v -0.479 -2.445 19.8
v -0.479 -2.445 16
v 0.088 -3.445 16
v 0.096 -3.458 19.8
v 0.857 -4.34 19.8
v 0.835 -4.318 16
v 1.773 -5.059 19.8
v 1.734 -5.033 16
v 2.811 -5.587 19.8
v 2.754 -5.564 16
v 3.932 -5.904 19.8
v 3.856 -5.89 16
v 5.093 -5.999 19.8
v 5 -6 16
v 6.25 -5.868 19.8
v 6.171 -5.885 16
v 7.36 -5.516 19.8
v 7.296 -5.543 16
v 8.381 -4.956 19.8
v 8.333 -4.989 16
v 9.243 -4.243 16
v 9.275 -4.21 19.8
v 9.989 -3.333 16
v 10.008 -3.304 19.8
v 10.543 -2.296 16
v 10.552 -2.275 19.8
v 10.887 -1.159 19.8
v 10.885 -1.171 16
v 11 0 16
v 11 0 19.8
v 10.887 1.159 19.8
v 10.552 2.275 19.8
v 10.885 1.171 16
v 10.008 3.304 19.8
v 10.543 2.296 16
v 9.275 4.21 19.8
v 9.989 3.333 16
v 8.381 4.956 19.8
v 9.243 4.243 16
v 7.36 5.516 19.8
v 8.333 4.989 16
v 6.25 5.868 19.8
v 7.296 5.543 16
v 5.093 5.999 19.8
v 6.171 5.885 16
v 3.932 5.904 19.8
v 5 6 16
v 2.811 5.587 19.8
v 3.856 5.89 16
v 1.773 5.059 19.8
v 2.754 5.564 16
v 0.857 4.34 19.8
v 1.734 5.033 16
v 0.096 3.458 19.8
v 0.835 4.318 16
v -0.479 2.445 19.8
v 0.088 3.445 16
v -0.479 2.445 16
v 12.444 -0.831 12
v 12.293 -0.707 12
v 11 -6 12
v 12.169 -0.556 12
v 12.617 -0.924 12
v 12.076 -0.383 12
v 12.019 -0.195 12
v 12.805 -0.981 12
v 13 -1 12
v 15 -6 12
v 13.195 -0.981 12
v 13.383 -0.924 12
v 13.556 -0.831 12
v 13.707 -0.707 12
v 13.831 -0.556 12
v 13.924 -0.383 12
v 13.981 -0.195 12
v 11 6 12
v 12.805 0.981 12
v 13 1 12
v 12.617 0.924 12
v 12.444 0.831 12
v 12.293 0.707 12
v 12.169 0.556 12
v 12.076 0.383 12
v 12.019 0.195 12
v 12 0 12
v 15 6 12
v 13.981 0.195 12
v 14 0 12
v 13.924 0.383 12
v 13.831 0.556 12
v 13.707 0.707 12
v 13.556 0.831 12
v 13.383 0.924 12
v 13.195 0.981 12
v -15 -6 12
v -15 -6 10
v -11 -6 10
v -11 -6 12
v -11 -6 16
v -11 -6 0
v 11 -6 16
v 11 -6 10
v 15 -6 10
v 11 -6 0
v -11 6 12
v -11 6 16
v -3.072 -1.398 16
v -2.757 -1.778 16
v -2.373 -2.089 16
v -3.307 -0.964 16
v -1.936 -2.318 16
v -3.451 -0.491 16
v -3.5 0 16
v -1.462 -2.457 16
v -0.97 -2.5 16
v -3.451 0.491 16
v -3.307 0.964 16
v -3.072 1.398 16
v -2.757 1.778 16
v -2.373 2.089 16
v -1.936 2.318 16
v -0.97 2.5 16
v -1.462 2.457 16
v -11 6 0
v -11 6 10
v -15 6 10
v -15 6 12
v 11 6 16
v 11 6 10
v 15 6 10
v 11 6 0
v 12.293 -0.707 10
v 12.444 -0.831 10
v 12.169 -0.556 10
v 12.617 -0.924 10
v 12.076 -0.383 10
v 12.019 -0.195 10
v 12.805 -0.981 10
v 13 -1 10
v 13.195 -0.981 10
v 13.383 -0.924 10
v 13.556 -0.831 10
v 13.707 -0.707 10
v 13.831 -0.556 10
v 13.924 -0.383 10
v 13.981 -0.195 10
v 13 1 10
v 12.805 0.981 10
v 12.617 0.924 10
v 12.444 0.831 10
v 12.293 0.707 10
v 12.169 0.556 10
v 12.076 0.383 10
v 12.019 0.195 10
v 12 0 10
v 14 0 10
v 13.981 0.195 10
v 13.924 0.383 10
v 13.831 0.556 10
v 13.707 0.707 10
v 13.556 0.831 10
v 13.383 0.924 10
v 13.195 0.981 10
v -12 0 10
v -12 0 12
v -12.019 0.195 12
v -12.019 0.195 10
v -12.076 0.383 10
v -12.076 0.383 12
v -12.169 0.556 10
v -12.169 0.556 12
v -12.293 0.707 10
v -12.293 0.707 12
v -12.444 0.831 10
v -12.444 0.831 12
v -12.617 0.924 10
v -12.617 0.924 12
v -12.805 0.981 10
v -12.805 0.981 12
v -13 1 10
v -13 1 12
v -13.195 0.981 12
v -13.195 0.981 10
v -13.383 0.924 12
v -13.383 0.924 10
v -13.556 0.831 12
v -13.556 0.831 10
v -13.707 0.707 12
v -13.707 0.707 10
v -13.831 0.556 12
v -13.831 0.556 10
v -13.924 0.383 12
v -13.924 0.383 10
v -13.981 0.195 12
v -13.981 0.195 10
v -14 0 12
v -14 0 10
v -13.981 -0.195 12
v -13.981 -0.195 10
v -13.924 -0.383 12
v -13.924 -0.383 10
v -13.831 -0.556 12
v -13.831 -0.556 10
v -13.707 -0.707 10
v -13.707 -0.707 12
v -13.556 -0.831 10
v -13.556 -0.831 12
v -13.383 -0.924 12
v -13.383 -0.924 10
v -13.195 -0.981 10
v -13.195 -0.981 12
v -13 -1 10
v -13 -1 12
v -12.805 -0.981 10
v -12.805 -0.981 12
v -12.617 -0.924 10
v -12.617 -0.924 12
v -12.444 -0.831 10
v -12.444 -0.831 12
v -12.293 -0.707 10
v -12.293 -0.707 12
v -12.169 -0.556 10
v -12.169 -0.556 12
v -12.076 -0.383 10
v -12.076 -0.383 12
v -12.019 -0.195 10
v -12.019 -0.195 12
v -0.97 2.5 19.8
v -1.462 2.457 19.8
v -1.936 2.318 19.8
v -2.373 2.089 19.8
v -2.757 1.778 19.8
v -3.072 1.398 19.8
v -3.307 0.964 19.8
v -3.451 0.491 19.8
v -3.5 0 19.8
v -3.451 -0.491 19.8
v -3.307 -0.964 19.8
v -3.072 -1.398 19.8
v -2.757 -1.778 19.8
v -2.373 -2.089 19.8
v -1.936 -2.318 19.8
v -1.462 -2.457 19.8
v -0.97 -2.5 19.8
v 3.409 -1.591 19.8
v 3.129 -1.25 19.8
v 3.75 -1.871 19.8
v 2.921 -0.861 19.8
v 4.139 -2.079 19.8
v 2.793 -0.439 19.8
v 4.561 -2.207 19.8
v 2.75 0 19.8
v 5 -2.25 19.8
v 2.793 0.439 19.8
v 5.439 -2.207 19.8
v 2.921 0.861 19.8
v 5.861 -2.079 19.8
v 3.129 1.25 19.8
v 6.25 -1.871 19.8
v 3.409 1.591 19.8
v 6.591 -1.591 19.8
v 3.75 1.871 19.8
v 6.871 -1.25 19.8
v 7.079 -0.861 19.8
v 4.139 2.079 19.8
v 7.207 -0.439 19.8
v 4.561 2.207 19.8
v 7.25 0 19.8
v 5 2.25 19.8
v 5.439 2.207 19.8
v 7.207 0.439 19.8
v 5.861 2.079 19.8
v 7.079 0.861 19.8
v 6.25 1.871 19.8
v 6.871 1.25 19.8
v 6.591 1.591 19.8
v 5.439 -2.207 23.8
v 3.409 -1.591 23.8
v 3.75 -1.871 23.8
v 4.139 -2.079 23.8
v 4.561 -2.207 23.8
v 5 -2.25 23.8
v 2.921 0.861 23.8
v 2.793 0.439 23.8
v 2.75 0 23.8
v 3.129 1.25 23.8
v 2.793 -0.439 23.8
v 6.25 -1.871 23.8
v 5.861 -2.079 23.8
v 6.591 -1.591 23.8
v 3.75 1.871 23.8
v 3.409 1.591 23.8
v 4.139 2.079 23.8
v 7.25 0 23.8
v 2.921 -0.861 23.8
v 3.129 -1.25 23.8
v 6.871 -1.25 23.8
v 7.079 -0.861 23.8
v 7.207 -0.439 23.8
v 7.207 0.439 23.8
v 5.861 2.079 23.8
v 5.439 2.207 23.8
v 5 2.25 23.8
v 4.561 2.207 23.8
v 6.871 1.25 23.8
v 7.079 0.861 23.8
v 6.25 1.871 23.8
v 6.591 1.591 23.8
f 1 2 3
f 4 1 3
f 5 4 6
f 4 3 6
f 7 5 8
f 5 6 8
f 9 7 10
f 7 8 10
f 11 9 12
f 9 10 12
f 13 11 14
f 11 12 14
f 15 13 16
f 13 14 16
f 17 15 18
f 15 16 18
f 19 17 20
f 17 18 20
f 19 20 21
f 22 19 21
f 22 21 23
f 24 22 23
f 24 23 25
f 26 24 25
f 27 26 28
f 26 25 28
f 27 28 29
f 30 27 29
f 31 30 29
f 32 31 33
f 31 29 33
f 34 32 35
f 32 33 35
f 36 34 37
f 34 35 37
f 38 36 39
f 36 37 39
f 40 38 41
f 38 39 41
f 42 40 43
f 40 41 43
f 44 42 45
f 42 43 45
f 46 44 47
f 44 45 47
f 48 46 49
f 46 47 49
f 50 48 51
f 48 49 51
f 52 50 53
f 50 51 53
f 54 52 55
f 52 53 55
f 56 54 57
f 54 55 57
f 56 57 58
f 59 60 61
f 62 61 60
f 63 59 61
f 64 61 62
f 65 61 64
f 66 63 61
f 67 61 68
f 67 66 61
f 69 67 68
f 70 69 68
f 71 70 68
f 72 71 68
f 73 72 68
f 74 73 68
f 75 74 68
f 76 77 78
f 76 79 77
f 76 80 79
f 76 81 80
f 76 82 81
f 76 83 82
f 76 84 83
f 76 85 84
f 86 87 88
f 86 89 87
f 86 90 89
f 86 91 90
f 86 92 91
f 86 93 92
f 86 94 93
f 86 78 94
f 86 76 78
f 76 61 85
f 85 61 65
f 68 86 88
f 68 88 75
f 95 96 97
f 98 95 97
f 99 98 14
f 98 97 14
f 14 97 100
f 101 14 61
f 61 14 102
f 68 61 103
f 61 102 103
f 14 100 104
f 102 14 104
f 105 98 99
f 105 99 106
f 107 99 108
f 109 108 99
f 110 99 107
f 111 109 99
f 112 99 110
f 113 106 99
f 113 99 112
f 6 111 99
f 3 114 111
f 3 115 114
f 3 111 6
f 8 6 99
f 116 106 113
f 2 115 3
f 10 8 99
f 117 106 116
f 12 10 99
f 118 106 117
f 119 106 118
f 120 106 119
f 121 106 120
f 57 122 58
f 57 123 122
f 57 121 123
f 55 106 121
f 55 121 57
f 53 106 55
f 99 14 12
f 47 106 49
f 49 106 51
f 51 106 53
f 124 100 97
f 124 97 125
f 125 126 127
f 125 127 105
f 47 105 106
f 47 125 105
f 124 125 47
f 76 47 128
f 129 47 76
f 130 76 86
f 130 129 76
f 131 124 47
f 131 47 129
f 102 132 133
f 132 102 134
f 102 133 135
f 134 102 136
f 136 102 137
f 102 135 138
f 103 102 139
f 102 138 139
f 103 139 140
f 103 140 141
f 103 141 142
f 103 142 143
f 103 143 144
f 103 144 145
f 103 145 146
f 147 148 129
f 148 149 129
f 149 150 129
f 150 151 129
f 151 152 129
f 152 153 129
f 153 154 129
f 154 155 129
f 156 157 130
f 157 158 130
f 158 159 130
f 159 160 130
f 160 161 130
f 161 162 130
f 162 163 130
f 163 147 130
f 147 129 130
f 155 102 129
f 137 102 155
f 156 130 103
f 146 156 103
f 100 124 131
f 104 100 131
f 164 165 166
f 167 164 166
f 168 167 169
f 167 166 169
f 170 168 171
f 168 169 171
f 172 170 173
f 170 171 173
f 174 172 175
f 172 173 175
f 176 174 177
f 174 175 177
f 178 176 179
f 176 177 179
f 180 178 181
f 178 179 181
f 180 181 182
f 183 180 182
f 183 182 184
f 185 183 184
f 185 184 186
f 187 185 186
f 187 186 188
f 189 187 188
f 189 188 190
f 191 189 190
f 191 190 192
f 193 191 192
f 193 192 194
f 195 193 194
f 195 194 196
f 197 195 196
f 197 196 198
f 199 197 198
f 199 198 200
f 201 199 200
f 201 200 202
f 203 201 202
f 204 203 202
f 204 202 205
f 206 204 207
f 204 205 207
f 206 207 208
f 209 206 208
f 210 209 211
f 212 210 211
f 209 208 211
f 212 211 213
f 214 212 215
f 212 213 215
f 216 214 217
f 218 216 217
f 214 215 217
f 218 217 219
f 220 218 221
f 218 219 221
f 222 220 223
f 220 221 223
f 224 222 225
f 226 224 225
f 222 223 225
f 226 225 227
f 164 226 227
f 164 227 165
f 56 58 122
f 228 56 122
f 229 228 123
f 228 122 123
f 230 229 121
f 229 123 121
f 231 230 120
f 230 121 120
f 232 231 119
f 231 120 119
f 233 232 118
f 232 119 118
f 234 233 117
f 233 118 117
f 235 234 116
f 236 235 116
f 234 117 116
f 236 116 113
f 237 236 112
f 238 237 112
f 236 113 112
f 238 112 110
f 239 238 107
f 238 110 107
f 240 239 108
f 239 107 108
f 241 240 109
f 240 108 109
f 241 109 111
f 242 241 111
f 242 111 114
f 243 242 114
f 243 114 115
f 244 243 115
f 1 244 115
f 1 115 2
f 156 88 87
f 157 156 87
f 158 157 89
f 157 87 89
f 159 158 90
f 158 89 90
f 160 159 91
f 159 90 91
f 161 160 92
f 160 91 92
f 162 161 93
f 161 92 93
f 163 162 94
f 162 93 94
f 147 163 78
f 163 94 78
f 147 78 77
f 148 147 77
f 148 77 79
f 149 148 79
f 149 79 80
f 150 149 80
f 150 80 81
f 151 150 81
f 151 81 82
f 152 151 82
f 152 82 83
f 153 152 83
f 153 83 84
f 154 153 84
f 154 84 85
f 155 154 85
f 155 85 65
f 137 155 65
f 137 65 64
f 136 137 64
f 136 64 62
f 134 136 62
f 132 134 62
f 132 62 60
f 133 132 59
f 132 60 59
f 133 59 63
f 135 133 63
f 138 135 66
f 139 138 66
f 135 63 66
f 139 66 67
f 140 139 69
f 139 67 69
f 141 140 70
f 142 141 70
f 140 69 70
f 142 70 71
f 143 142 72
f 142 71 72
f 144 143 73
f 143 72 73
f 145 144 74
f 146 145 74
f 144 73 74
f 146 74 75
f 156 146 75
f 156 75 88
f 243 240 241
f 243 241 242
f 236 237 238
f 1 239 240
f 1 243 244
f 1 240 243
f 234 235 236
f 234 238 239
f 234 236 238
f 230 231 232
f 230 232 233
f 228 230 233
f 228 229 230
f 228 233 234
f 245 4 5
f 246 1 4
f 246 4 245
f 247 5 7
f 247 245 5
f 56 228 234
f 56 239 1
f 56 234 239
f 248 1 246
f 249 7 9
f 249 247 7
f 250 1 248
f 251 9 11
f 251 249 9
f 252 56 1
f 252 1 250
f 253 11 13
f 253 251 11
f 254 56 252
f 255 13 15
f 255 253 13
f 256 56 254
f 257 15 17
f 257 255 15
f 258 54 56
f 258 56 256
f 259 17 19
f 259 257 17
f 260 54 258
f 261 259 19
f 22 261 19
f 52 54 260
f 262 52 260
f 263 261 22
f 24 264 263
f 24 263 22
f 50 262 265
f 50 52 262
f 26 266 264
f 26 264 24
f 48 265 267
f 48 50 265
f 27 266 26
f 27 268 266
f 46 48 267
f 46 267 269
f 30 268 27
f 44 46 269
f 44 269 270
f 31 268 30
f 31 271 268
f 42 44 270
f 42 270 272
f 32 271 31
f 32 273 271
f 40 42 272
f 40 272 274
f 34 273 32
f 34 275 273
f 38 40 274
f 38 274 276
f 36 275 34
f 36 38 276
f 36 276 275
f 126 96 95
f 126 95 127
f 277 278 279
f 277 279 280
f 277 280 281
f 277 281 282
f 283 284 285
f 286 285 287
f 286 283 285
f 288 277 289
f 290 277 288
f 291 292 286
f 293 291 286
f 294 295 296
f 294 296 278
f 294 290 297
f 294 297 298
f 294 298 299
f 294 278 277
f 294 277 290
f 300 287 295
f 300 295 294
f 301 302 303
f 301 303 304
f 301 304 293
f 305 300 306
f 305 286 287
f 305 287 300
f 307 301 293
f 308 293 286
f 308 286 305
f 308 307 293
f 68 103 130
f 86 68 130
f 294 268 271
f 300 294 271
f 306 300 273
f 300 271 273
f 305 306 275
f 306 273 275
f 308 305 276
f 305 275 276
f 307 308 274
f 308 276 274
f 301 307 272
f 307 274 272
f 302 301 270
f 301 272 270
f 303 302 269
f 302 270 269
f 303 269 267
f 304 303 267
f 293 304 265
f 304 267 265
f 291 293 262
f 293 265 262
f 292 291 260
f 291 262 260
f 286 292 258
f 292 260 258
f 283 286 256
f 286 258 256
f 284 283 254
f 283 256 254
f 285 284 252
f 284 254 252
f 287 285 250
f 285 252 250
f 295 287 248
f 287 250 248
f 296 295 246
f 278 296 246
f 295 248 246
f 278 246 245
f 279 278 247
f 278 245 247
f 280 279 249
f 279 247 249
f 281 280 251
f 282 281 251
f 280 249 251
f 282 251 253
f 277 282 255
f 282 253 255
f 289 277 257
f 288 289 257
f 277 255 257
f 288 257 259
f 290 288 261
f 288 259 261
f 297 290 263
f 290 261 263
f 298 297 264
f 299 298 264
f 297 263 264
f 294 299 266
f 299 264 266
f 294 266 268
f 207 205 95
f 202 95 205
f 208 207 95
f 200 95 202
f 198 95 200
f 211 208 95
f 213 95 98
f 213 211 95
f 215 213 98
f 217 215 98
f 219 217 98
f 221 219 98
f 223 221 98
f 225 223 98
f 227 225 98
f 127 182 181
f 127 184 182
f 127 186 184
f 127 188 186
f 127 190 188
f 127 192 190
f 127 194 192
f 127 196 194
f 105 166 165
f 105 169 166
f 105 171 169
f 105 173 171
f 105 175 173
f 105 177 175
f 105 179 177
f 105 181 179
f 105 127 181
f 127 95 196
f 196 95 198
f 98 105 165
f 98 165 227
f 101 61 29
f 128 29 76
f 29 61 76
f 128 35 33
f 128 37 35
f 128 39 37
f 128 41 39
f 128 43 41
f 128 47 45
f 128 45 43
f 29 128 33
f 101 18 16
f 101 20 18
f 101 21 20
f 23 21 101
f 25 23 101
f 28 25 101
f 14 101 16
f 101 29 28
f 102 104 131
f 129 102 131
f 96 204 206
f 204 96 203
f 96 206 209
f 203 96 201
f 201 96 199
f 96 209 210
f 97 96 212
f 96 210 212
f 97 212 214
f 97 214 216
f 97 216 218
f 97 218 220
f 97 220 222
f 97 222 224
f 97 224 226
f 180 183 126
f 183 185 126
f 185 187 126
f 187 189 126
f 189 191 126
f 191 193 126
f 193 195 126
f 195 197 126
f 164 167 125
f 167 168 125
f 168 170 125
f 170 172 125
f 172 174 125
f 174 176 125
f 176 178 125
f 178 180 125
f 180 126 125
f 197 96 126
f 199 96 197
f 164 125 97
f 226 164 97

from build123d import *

# Parameters (mm, degrees)
SKETCH1_W      = 22
SKETCH1_H      = 12
EXTRUDE1_DEPTH = 10
SKETCH2_W      = 30
SKETCH2_H      = 12
EXTRUDE2_DEPTH = 2
SKETCH3_W      = 22
SKETCH3_H      = 12
EXTRUDE3_DEPTH = 4
SKETCH4_R      = 1
EXTRUDE4_DEPTH = 13
EXTRUDE5_DEPTH = 3.8
SKETCH6_R      = 2.25
EXTRUDE6_DEPTH = 4


with BuildPart() as part:
    # Sketch1 → Extrude1 (new body)
    with BuildSketch(Plane.XY):
        Rectangle(SKETCH1_W, SKETCH1_H)
    extrude(amount=EXTRUDE1_DEPTH)

    # Sketch2 → Extrude2 (add)
    with BuildSketch(Plane.XY.offset(10)):
        Rectangle(SKETCH2_W, SKETCH2_H)
    extrude(amount=EXTRUDE2_DEPTH)

    # Sketch3 → Extrude3 (add)
    with BuildSketch(Plane.XY.offset(12)):
        Rectangle(SKETCH3_W, SKETCH3_H)
    extrude(amount=EXTRUDE3_DEPTH)

    # Sketch4 → Extrude4 (cut, through all)
    with BuildSketch(Plane.XY.offset(12)):
        with Locations((-13, 0)):
            Circle(SKETCH4_R)
        with Locations((13, 0)):
            Circle(SKETCH4_R)
    extrude(amount=-EXTRUDE4_DEPTH, mode=Mode.SUBTRACT)

    # Sketch5 → Extrude5 (add)
    with BuildSketch(Plane.XY.offset(16)):
        with BuildLine():
            ThreePointArc((-0.479166667, -2.445144707), (11, 0), (-0.479166667, 2.445144707))
            ThreePointArc((-0.479166667, 2.445144707), (-3.5, 0), (-0.479166667, -2.445144707))
        make_face()
    extrude(amount=EXTRUDE5_DEPTH)

    # Sketch6 → Extrude6 (add)
    with BuildSketch(Plane.XY.offset(19.8)):
        with Locations((5, 0)):
            Circle(SKETCH6_R)
    extrude(amount=EXTRUDE6_DEPTH)


solid = part.part
